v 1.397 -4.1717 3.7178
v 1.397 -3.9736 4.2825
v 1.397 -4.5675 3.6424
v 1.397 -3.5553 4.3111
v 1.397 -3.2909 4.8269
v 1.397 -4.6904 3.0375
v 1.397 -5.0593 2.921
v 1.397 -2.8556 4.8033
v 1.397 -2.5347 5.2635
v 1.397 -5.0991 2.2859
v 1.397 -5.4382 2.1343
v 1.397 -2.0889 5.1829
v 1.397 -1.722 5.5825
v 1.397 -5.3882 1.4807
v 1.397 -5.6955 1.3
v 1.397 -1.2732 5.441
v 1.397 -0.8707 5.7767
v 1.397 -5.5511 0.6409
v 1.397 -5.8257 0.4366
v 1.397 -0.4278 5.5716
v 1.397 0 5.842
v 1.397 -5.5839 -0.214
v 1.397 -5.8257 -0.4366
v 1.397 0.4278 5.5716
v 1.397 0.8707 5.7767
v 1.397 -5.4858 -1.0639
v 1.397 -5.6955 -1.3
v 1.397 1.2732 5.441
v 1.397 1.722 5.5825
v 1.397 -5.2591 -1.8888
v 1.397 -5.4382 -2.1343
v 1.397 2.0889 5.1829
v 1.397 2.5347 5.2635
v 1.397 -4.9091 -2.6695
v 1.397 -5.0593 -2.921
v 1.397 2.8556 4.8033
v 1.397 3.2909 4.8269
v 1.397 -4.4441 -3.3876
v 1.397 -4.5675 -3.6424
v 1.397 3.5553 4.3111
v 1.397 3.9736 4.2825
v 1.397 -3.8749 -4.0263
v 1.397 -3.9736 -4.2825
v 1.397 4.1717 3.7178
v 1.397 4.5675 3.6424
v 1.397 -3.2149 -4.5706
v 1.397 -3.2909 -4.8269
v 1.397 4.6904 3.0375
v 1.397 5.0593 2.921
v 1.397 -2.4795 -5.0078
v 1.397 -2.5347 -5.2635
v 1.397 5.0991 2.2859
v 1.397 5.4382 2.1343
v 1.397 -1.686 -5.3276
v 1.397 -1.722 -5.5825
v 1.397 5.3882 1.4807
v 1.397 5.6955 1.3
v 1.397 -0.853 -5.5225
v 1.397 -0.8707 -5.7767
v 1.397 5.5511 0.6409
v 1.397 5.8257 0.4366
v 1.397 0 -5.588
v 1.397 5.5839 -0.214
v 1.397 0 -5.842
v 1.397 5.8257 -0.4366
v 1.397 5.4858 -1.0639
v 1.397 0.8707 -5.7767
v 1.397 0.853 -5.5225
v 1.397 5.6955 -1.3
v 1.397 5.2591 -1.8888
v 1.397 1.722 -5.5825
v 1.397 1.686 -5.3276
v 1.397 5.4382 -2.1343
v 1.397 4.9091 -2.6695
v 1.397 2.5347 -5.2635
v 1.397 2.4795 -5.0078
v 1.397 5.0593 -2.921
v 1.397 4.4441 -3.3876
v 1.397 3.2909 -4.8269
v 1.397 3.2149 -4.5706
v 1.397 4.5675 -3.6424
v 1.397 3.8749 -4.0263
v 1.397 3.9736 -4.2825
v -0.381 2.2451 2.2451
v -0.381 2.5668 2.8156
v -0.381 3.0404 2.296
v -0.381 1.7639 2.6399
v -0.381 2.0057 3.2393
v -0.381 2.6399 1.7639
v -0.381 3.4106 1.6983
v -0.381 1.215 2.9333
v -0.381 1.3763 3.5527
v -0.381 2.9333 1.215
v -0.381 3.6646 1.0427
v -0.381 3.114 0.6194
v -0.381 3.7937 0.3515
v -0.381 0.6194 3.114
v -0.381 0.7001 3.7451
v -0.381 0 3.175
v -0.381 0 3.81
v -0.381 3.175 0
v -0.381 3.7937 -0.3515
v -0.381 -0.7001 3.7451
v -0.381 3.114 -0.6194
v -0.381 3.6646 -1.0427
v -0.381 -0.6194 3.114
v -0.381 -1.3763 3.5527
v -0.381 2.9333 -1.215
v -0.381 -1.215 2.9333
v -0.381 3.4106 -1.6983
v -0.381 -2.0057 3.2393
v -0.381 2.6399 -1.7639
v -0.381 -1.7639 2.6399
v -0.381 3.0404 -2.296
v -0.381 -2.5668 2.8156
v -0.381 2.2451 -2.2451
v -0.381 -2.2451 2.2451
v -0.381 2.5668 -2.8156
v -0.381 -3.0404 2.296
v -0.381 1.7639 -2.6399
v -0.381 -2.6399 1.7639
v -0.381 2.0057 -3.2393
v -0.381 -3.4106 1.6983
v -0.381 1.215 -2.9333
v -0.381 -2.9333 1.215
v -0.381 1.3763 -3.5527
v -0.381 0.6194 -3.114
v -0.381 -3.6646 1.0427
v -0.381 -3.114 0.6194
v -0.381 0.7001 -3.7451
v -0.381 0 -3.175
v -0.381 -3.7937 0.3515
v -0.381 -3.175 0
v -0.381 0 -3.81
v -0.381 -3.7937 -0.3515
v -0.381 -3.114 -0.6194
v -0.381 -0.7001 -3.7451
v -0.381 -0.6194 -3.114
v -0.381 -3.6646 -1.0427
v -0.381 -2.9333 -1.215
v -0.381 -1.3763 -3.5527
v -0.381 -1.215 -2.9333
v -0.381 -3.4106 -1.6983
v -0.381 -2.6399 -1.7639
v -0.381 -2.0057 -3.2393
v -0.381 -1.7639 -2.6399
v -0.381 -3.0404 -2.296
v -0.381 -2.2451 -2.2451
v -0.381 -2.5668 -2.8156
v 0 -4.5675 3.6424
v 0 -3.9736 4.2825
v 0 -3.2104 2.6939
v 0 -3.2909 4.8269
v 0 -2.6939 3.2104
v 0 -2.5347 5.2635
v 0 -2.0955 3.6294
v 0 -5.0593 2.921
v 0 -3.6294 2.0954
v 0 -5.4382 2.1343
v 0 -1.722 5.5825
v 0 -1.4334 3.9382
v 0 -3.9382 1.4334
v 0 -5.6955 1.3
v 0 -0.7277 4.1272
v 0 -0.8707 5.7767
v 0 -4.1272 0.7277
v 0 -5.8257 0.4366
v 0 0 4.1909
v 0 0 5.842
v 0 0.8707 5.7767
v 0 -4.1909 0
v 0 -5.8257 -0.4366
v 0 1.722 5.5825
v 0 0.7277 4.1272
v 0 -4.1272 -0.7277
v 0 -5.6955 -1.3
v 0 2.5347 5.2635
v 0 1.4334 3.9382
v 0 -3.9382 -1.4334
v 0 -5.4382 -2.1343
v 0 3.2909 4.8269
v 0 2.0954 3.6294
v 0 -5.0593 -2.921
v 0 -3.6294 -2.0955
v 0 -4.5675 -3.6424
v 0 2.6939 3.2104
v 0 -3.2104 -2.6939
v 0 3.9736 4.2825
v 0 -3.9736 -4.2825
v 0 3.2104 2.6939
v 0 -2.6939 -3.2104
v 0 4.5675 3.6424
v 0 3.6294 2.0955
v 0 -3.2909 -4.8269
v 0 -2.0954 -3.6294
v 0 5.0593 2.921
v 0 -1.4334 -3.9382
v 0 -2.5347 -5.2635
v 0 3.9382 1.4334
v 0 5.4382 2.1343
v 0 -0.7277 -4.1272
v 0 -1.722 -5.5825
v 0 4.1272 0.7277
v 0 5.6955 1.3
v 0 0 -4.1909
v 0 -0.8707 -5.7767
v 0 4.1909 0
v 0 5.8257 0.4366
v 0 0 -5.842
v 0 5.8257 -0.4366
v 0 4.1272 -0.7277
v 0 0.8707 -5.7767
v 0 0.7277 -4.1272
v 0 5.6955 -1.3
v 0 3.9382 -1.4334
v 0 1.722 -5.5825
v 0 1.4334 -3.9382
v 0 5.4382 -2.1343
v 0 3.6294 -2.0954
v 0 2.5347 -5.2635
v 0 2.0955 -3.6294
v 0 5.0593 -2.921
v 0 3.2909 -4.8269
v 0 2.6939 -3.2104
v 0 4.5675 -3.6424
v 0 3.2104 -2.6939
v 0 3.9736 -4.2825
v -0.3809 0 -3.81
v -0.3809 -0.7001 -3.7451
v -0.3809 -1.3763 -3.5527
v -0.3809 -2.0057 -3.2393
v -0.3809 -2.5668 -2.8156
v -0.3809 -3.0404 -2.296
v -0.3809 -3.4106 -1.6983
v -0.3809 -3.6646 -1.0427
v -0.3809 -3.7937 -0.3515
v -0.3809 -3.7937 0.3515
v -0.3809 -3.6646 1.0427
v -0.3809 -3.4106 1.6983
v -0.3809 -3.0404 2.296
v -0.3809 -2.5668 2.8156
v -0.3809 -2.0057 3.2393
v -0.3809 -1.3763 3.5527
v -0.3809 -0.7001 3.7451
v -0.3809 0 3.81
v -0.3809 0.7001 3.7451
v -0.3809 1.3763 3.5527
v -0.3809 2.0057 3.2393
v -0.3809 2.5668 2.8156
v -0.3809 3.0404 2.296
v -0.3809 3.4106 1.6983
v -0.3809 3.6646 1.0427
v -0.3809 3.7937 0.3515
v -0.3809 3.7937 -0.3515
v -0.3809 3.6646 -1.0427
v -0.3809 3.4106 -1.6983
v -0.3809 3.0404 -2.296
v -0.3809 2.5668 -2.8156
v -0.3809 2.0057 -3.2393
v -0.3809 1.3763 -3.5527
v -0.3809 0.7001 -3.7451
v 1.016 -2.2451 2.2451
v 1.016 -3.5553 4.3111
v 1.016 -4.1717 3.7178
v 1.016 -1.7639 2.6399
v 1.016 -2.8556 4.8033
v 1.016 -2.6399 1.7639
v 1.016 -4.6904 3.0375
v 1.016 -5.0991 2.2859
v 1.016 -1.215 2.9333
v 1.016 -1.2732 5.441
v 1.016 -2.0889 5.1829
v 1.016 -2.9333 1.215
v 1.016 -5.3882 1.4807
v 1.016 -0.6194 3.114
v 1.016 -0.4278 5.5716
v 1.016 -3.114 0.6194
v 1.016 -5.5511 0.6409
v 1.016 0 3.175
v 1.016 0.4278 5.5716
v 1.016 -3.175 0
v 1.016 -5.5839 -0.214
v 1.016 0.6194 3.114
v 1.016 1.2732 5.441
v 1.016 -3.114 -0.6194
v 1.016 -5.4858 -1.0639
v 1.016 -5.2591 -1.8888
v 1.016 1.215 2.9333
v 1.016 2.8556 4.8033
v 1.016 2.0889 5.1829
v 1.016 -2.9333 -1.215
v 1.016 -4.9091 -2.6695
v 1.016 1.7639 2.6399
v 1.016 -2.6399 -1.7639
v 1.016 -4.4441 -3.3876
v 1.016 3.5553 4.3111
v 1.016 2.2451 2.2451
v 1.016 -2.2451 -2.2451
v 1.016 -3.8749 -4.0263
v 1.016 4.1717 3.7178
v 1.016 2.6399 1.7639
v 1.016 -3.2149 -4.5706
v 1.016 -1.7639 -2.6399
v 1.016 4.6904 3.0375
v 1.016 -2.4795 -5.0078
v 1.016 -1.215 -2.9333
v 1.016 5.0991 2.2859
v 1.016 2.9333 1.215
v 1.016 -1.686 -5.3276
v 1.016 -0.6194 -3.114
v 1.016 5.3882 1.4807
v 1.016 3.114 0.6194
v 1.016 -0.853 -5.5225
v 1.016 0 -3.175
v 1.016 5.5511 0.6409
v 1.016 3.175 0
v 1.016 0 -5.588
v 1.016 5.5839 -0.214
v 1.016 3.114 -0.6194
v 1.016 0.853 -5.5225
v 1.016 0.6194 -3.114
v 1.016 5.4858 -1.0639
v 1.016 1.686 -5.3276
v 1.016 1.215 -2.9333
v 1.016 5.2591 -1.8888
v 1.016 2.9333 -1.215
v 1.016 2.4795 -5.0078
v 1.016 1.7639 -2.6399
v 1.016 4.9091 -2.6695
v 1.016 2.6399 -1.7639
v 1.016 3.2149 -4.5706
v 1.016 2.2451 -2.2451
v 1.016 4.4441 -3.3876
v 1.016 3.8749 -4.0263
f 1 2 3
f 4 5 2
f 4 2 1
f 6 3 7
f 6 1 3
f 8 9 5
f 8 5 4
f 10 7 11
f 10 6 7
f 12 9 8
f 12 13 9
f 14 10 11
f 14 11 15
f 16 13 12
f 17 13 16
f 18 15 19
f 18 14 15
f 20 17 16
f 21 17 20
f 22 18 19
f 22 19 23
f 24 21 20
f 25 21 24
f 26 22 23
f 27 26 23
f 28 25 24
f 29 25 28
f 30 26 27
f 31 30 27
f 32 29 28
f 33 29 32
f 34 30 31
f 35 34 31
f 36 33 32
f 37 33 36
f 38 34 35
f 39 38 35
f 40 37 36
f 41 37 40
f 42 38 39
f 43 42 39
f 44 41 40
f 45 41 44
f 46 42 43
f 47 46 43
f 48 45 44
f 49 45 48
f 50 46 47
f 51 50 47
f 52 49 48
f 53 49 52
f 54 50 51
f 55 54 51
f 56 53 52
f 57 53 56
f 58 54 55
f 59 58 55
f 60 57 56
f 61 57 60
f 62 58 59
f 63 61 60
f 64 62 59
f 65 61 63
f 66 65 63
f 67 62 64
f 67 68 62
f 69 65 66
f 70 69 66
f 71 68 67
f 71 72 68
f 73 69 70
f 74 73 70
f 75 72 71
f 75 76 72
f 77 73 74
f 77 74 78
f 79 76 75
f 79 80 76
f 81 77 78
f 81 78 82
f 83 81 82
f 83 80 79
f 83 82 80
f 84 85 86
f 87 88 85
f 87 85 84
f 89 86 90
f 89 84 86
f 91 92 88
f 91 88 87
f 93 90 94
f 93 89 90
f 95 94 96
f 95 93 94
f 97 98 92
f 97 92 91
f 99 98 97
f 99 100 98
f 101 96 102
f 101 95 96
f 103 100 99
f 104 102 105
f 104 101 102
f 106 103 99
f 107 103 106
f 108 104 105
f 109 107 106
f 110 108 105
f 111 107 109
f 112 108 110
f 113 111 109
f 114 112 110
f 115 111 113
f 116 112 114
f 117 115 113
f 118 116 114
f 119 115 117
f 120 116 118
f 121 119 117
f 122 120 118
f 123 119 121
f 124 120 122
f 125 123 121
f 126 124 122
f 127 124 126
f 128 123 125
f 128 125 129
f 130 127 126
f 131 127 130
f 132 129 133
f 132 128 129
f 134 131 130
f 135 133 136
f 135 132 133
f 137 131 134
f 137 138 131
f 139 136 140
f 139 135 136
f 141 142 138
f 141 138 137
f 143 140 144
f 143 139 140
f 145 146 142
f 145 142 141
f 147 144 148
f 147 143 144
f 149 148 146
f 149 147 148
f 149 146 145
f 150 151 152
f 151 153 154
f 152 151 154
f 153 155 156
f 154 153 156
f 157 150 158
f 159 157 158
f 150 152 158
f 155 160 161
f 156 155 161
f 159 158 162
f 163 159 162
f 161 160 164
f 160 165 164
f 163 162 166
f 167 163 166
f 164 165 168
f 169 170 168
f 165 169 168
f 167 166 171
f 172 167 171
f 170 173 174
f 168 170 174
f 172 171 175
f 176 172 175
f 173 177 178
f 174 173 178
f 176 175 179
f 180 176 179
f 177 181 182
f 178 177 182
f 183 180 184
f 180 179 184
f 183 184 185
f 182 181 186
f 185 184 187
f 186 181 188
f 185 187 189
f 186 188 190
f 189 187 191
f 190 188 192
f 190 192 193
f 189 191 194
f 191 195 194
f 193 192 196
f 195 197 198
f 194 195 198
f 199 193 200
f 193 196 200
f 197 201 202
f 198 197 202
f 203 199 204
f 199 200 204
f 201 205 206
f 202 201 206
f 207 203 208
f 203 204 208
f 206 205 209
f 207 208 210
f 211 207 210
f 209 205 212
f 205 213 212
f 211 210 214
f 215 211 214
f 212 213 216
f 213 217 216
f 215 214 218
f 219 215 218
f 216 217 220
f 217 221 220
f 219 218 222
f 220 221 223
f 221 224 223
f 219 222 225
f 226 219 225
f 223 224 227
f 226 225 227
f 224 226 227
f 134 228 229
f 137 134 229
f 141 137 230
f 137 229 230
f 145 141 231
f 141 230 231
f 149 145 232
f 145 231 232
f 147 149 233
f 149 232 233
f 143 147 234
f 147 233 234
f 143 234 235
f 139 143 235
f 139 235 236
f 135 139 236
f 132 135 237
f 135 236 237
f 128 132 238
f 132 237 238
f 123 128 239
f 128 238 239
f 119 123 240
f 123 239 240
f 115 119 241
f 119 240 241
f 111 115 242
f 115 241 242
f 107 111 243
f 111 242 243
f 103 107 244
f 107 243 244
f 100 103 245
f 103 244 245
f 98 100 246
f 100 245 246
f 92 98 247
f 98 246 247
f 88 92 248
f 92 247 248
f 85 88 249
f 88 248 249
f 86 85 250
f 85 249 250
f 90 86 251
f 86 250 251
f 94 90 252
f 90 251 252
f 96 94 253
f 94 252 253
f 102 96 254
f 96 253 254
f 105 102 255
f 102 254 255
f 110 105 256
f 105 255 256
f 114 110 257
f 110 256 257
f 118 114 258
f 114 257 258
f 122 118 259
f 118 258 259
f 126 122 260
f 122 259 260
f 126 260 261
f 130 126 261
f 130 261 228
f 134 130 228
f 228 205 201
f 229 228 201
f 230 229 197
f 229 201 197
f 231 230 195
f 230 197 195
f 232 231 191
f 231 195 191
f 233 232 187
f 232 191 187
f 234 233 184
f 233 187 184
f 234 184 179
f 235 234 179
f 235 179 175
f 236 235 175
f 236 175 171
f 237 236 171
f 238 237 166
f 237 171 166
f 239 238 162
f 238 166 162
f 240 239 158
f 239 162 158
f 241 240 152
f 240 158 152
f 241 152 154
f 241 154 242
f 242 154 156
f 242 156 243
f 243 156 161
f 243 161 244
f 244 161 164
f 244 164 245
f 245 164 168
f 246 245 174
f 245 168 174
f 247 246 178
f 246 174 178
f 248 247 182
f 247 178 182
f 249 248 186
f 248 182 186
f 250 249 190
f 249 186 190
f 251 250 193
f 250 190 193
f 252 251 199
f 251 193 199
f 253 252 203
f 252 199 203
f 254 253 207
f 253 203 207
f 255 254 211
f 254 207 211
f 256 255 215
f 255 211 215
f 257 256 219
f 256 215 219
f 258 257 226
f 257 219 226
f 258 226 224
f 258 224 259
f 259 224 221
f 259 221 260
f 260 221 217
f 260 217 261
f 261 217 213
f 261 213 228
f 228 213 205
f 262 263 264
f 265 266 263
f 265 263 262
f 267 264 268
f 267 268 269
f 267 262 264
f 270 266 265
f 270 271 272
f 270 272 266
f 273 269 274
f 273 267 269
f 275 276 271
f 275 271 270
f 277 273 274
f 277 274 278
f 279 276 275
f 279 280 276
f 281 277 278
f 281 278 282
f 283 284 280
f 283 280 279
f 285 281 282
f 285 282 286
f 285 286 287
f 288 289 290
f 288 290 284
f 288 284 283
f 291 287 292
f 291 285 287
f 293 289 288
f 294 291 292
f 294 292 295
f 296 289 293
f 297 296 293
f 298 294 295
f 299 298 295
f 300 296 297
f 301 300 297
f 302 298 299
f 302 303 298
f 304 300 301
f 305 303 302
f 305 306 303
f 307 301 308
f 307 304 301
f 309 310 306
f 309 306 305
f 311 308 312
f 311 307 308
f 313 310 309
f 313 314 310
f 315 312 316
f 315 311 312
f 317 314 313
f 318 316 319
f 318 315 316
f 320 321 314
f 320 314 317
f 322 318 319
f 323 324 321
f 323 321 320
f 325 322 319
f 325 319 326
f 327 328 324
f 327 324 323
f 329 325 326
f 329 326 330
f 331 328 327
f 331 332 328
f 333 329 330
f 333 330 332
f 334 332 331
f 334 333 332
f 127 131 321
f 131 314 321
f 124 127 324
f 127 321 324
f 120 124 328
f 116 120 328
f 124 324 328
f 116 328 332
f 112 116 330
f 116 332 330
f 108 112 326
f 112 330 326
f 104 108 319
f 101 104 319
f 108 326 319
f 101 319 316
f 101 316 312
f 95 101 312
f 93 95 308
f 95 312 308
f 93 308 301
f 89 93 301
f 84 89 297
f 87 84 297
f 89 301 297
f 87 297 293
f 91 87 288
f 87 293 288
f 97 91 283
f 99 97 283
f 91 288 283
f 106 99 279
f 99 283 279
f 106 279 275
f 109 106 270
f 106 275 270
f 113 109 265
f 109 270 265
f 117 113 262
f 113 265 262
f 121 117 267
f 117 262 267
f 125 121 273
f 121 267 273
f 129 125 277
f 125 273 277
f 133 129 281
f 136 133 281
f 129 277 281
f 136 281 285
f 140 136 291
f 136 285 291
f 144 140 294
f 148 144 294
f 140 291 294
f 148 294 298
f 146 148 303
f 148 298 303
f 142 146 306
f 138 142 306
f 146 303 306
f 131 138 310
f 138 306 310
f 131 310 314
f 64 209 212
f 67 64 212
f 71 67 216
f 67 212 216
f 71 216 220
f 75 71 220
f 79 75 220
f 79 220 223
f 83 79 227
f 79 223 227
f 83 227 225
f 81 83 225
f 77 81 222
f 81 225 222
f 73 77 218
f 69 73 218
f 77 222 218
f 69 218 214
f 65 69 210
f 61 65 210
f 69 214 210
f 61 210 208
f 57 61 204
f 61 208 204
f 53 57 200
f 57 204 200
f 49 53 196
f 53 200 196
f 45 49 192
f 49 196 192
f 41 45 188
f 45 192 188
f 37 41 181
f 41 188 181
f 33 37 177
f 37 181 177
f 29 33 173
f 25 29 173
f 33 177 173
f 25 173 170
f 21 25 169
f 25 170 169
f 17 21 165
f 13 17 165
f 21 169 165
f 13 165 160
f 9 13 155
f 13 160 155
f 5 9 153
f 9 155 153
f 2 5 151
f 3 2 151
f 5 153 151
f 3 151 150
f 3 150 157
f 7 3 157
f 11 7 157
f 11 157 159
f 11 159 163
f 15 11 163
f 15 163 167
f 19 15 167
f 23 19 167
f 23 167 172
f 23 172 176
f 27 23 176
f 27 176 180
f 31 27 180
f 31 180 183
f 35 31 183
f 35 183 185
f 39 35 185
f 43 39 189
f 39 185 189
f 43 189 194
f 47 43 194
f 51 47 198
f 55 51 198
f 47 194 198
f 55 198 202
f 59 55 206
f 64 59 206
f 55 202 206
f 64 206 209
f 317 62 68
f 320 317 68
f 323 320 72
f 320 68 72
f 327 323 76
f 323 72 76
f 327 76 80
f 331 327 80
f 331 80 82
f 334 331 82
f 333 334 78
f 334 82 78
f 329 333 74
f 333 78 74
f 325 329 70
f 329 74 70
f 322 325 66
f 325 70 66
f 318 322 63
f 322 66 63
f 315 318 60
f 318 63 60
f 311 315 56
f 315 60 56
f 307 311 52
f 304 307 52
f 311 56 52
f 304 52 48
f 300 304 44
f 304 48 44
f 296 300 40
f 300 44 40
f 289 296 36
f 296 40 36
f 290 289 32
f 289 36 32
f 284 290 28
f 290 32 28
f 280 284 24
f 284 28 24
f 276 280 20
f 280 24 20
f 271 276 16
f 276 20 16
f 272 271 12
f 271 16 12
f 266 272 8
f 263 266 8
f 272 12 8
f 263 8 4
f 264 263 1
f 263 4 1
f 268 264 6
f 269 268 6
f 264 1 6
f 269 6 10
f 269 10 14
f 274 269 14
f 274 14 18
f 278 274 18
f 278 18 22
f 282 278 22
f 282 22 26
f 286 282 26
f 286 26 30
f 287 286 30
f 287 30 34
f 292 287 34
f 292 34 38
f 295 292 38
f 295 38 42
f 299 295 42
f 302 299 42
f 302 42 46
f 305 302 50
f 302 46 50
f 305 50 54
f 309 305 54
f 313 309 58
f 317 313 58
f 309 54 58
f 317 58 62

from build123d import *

# Parameters (mm, degrees)
SKETCH1_R           = 5.842
BOSS_EXTRUDE1_DEPTH = 1.397
SKETCH2_R           = 5.588
CUT_EXTRUDE1_DEPTH  = 0.381
SKETCH3_R           = 3.175
CUT_EXTRUDE2_DEPTH  = 9.324072561
SKETCH4_R           = 3.81
BOSS_EXTRUDE2_DEPTH = 0.381
CHAMFER1_SIZE       = 0.381
SKETCH5_R           = 3.175
CUT_EXTRUDE3_DEPTH  = 9.379113139


with BuildPart() as part:
    # Sketch1 → Boss-Extrude1 (new body)
    with BuildSketch(Plane(origin=(0, 0, 0), x_dir=(0, 0, -1), z_dir=(1, 0, 0))):
        Circle(SKETCH1_R)
    extrude(amount=BOSS_EXTRUDE1_DEPTH)

    # Sketch2 → Cut-Extrude1 (cut)
    with BuildSketch(Plane(origin=(1.397, 0, 0), x_dir=(0, 0, -1), z_dir=(1, 0, 0))):
        Circle(SKETCH2_R)
    extrude(amount=-CUT_EXTRUDE1_DEPTH, mode=Mode.SUBTRACT)

    # Sketch3 → Cut-Extrude2 (cut, through all)
    with BuildSketch(Plane(origin=(1.016, 0, 0), x_dir=(0, 0, -1), z_dir=(1, 0, 0))):
        Circle(SKETCH3_R)
    extrude(amount=-CUT_EXTRUDE2_DEPTH, mode=Mode.SUBTRACT)

    # Sketch4 → Boss-Extrude2 (add)
    with BuildSketch(Plane.ZY):
        with Locations(Location((0, 0, 0), (0, 0, 180))):
            Circle(SKETCH4_R)
    extrude(amount=BOSS_EXTRUDE2_DEPTH)

    # Chamfer1
    chamfer1_edges = [part.edges().sort_by_distance(p)[0] for p in [
        (0, 0, 3.81),
    ]]
    chamfer(chamfer1_edges, length=CHAMFER1_SIZE - 0.0001)  # a hair under: the kernel refuses the full size

    # Sketch5 → Cut-Extrude3 (cut, through all)
    with BuildSketch(Plane(origin=(0, 0, 0), x_dir=(0, 0, -1), z_dir=(1, 0, 0))):
        Circle(SKETCH5_R)
    extrude(amount=-CUT_EXTRUDE3_DEPTH, mode=Mode.SUBTRACT)


solid = part.part
